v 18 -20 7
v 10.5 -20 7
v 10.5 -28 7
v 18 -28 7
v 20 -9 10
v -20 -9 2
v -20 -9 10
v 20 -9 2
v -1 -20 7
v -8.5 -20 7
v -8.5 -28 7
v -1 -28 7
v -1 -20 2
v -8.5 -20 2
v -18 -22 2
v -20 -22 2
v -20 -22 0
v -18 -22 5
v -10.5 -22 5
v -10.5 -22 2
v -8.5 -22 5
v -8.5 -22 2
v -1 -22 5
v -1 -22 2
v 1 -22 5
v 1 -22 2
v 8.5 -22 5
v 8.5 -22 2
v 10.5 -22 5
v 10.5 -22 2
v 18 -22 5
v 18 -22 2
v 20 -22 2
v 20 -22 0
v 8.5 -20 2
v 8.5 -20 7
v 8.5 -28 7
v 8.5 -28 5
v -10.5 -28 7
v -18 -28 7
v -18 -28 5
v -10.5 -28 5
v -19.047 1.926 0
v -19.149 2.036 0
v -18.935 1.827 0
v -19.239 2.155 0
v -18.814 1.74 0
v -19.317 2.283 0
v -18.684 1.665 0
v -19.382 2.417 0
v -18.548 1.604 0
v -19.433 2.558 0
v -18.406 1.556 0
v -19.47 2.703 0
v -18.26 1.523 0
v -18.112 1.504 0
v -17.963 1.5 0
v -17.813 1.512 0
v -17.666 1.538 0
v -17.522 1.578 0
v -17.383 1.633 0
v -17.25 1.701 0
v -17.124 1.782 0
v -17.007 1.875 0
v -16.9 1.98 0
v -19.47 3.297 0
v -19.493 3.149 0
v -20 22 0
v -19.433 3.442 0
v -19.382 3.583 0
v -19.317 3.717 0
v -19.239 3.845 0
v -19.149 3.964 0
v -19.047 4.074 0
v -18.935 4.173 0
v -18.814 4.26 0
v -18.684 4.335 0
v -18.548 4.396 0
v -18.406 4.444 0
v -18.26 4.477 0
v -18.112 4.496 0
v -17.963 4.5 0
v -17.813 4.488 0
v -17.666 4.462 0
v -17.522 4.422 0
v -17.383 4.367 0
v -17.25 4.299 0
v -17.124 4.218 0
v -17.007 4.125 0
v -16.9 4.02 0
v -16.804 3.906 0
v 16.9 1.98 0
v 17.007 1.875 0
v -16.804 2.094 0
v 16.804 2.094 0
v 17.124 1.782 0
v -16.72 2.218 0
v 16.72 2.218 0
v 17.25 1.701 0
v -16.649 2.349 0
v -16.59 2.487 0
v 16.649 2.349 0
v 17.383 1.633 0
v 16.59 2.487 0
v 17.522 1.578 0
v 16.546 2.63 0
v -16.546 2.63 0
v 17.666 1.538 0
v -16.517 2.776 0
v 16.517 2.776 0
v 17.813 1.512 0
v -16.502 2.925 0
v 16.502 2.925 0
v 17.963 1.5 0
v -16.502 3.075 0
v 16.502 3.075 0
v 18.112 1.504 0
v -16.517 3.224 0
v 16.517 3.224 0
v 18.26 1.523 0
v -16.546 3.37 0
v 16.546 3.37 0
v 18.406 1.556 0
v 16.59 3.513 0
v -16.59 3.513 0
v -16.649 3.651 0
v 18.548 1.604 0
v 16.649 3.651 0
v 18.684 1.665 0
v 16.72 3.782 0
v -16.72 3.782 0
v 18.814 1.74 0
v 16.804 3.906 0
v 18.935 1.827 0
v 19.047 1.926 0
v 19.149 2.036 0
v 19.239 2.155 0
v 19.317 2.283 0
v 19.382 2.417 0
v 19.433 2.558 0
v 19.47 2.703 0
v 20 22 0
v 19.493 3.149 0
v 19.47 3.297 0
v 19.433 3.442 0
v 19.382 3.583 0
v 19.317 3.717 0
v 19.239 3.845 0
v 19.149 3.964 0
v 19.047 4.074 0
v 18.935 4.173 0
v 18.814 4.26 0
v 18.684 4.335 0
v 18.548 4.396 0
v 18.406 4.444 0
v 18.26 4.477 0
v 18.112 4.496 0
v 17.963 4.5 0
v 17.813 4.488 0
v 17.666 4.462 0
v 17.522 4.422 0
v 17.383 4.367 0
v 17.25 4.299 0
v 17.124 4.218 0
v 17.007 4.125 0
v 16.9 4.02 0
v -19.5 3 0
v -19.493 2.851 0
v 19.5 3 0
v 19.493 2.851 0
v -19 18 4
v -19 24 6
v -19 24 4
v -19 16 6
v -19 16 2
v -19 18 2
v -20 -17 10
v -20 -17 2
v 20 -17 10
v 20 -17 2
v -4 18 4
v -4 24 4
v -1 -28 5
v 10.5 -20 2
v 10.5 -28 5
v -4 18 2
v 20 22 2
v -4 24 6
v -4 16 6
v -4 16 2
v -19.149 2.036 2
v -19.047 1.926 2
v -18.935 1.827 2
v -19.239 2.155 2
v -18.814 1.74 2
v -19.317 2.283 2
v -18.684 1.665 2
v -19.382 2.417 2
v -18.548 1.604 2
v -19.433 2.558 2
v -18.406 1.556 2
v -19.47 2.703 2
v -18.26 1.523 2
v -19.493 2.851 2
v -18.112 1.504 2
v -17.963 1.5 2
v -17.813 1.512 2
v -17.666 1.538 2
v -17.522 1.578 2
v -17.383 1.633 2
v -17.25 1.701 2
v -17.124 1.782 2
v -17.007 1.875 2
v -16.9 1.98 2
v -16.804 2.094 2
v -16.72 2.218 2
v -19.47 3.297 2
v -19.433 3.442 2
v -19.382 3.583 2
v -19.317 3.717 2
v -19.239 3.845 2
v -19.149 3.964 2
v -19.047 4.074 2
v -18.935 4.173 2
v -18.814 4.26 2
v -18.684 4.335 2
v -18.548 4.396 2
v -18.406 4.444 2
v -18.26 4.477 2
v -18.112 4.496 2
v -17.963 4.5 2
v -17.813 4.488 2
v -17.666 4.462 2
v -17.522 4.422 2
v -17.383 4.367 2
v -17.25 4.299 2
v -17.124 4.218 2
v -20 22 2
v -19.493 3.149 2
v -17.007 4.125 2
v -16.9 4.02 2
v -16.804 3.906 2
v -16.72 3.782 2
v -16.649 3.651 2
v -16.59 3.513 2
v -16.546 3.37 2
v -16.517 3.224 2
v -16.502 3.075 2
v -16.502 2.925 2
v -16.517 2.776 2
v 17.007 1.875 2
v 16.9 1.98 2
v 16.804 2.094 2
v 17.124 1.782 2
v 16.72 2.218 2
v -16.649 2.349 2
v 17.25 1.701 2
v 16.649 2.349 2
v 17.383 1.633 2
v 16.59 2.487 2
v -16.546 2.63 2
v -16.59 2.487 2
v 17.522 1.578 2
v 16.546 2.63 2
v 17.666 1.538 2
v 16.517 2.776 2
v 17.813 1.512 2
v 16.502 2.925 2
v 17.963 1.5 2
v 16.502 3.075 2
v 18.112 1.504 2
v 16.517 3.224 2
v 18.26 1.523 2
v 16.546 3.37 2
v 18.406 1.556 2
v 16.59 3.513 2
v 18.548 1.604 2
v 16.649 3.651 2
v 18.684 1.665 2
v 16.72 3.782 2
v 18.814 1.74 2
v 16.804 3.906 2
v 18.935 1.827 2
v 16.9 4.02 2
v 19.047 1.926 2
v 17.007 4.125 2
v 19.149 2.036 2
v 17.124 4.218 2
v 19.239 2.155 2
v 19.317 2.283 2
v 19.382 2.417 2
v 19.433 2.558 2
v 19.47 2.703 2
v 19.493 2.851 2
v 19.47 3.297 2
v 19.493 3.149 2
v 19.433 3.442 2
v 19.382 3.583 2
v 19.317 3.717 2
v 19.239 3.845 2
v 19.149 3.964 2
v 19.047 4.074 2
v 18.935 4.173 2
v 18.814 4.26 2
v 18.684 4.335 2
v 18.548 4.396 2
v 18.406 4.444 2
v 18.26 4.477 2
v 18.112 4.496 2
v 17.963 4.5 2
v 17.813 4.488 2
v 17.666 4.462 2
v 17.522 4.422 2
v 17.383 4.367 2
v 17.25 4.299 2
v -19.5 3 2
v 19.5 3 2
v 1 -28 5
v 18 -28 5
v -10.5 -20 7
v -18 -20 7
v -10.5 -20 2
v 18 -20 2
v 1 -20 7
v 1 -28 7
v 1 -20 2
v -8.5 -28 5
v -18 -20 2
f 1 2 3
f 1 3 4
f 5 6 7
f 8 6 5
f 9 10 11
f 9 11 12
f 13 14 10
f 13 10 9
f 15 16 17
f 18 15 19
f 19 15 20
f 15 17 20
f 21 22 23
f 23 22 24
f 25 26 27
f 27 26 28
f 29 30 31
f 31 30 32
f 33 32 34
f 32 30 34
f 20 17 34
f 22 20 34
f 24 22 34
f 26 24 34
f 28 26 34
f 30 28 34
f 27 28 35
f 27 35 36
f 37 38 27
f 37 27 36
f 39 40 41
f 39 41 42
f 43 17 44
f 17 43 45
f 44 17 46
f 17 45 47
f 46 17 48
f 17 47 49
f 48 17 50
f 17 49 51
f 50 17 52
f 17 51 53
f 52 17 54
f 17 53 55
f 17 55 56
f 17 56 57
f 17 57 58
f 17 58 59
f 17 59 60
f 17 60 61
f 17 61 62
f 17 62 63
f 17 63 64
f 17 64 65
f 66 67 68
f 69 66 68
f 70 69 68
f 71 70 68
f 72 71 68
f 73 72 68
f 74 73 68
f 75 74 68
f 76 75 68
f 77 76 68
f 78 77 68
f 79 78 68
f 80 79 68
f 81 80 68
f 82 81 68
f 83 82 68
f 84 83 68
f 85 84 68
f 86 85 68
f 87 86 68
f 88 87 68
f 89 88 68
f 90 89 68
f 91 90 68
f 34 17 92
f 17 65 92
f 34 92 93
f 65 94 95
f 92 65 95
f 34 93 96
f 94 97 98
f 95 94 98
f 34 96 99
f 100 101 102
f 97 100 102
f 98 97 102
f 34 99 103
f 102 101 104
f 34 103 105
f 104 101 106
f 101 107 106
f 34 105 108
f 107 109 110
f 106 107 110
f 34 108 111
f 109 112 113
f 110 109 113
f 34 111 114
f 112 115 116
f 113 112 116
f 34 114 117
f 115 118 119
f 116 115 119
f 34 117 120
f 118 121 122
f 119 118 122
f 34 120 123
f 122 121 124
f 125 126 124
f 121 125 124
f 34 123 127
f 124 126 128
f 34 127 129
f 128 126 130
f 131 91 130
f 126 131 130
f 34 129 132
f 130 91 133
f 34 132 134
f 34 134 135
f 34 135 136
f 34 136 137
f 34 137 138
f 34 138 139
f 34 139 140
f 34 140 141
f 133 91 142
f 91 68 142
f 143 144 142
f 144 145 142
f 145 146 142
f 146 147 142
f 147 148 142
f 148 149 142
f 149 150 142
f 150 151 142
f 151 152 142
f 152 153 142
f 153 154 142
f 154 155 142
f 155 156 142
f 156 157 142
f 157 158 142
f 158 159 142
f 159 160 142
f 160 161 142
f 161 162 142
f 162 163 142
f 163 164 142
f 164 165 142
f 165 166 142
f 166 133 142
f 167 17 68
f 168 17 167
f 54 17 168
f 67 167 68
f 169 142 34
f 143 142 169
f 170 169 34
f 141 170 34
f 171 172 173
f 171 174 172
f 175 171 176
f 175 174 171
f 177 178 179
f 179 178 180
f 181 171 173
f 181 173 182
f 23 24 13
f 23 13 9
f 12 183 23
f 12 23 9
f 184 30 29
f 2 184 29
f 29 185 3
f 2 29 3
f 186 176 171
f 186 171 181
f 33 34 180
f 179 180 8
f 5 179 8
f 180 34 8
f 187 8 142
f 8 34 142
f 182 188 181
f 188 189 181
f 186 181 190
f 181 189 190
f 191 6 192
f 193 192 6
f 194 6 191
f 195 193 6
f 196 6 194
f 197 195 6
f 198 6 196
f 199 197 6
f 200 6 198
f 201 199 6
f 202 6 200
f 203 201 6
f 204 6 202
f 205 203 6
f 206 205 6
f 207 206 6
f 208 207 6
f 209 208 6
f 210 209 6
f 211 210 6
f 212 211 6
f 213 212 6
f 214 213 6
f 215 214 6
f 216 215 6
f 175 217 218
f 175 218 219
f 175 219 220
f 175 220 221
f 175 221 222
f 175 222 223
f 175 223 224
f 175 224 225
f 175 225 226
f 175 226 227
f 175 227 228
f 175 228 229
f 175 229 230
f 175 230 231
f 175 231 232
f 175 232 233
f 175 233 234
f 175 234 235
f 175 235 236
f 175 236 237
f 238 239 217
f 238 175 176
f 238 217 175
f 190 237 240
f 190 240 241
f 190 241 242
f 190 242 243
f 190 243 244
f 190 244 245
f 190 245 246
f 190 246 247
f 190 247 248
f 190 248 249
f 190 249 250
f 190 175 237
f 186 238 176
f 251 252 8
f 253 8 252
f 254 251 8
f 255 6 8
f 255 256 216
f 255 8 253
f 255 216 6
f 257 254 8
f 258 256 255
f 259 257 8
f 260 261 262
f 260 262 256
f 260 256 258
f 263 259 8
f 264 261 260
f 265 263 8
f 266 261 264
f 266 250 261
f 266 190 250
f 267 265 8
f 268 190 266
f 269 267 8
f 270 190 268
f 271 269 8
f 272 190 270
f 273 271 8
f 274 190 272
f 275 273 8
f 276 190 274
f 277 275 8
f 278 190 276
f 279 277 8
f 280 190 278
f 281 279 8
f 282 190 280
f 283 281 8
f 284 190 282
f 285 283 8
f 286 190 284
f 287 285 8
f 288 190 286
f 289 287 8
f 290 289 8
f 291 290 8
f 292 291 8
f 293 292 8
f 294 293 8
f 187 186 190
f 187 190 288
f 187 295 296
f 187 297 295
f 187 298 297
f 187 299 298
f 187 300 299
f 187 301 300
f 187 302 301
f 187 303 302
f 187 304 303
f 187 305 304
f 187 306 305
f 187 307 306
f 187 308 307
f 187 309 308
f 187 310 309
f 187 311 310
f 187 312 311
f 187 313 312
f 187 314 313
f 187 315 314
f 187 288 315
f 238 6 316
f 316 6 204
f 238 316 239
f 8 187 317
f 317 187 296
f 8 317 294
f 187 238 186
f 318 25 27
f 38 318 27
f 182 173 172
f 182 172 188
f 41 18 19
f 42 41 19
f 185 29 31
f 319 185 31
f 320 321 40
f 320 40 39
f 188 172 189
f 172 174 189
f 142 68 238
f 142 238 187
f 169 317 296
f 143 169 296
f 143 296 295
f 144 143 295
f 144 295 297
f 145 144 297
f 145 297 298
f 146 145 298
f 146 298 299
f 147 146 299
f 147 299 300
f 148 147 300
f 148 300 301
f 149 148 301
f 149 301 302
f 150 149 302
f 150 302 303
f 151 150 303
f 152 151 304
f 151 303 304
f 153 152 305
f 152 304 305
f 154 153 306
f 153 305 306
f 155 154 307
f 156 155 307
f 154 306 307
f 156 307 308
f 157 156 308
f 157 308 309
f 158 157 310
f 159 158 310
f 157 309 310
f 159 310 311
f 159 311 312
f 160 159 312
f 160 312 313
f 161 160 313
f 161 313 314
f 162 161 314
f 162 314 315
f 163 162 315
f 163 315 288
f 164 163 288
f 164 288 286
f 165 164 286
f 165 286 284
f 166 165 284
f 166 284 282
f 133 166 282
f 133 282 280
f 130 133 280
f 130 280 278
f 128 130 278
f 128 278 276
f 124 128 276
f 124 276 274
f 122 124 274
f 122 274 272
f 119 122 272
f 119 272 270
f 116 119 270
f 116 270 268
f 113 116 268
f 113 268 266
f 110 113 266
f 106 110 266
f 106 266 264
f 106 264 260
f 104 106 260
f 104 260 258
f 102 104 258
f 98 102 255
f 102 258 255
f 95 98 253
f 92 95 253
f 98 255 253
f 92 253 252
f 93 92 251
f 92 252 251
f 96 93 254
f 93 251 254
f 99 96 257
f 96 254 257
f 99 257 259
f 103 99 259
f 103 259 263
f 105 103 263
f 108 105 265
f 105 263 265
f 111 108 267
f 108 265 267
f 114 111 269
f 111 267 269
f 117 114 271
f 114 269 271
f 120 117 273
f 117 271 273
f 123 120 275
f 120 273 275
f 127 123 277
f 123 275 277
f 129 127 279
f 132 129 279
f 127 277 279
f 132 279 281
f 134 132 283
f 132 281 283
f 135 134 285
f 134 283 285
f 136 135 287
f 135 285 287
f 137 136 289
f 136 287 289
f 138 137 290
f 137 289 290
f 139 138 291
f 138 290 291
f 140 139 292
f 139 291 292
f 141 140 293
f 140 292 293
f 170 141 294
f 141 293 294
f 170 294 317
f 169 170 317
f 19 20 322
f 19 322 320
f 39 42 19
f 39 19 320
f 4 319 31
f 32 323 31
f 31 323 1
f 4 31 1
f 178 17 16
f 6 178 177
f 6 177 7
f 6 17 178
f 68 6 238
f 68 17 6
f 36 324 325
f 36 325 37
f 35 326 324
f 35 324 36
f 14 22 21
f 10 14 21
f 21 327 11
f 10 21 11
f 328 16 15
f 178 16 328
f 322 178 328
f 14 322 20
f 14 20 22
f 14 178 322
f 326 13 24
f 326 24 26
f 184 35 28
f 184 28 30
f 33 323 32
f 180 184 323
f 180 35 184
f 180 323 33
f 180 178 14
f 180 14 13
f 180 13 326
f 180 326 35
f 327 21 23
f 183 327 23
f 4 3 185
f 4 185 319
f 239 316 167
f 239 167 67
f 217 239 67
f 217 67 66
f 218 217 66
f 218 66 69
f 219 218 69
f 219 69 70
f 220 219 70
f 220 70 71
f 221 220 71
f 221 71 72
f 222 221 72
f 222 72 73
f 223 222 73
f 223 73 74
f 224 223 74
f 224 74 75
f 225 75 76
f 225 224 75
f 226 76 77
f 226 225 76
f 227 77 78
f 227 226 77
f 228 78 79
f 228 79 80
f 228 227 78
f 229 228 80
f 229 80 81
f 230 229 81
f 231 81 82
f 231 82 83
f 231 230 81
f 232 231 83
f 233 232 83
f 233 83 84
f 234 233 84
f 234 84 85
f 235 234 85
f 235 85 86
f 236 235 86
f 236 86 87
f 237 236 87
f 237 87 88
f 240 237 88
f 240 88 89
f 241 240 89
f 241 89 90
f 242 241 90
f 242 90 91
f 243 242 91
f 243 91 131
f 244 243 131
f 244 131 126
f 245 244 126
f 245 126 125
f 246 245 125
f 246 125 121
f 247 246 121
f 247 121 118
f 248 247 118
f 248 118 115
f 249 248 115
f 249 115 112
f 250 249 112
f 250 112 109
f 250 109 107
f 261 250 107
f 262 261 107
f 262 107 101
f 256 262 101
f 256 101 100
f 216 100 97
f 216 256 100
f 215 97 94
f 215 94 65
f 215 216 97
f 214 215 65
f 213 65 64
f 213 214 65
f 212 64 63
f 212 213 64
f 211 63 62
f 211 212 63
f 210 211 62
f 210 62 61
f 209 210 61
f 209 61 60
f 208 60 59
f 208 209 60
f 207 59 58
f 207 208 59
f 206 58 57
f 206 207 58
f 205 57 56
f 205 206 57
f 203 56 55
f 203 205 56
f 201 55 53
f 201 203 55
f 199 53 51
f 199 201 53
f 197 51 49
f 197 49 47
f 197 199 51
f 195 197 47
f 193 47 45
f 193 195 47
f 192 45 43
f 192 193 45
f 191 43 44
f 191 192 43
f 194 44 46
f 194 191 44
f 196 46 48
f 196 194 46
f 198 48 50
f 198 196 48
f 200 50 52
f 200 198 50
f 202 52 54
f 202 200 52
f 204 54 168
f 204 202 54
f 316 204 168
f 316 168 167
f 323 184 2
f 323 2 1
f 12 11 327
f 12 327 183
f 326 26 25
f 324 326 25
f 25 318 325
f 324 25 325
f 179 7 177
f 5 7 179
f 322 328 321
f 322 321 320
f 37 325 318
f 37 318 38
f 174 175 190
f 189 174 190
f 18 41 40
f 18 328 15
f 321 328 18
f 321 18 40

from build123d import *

# Parameters (mm, degrees)
ESQUISSE1_W             = 40
ESQUISSE1_H             = 44
BOSS_EXTRU_1_DEPTH      = 2
ESQUISSE2_W             = 40
ESQUISSE2_H             = 8
BOSS_EXTRU_2_DEPTH      = 8
ESQUISSE3_W             = 36
ESQUISSE3_H             = 2
BOSS_EXTRU_3_DEPTH      = 5
ESQUISSE4_W             = 36
ESQUISSE4_H             = 2
BOSS_EXTRU_4_DEPTH      = 6
ENL_V_MAT_EXTRU_1_REACH = 56.772
ESQUISSE5_W             = 2
ESQUISSE5_H             = 5
ESQUISSE6_W             = 15
ESQUISSE6_H             = 2
BOSS_EXTRU_5_DEPTH      = 4
ESQUISSE7_W             = 15
ESQUISSE7_H             = 2
BOSS_EXTRU_6_DEPTH      = 6
ENL_V_MAT_EXTRU_2_REACH = 37.327
ESQUISSE8_R             = 1.5


with BuildPart() as part:
    # Esquisse1 → Boss.-Extru.1 (new body)
    with BuildSketch(Plane.XY):
        Rectangle(ESQUISSE1_W, ESQUISSE1_H)
    extrude(amount=BOSS_EXTRU_1_DEPTH)

    # Esquisse2 → Boss.-Extru.2 (add)
    with BuildSketch(Plane.XY.offset(2)):
        with Locations((0, -13)):
            Rectangle(ESQUISSE2_W, ESQUISSE2_H)
    extrude(amount=BOSS_EXTRU_2_DEPTH)

    # Esquisse3 → Boss.-Extru.3 (add)
    with BuildSketch(Plane.XY.offset(2)):
        with Locations((0, -21)):
            Rectangle(ESQUISSE3_W, ESQUISSE3_H)
    extrude(amount=BOSS_EXTRU_3_DEPTH)

    # Esquisse4 → Boss.-Extru.4 (add)
    with BuildSketch(Plane.XZ.offset(22)):
        with Locations((0, 6)):
            Rectangle(ESQUISSE4_W, ESQUISSE4_H)
    extrude(amount=BOSS_EXTRU_4_DEPTH)

    # Esquisse5 → Enlèv. mat.-Extru.1 (cut, up to next)
    with BuildSketch(Plane.XZ.offset(28), mode=Mode.PRIVATE) as enl_v_mat_extru_1_sk1:
        with Locations((-9.5, 4.5)):
            Rectangle(ESQUISSE5_W, ESQUISSE5_H)
    enl_v_mat_extru_1_tool1 = extrude(enl_v_mat_extru_1_sk1.sketch, amount=-ENL_V_MAT_EXTRU_1_REACH, mode=Mode.PRIVATE) & part.part
    # Esquisse5 → Enlèv. mat.-Extru.1 (cut, up to next)
    with BuildSketch(Plane.XZ.offset(28), mode=Mode.PRIVATE) as enl_v_mat_extru_1_sk2:
        with Locations((0, 4.5)):
            Rectangle(ESQUISSE5_W, ESQUISSE5_H)
    enl_v_mat_extru_1_tool2 = extrude(enl_v_mat_extru_1_sk2.sketch, amount=-ENL_V_MAT_EXTRU_1_REACH, mode=Mode.PRIVATE) & part.part
    # Esquisse5 → Enlèv. mat.-Extru.1 (cut, up to next)
    with BuildSketch(Plane.XZ.offset(28), mode=Mode.PRIVATE) as enl_v_mat_extru_1_sk3:
        with Locations((9.5, 4.5)):
            Rectangle(ESQUISSE5_W, ESQUISSE5_H)
    enl_v_mat_extru_1_tool3 = extrude(enl_v_mat_extru_1_sk3.sketch, amount=-ENL_V_MAT_EXTRU_1_REACH, mode=Mode.PRIVATE) & part.part
    add(enl_v_mat_extru_1_tool1.solids().sort_by_distance((-9.5, -28, 4.5))[0], mode=Mode.SUBTRACT)
    add(enl_v_mat_extru_1_tool2.solids().sort_by_distance((0, -28, 4.5))[0], mode=Mode.SUBTRACT)
    add(enl_v_mat_extru_1_tool3.solids().sort_by_distance((9.5, -28, 4.5))[0], mode=Mode.SUBTRACT)

    # Esquisse6 → Boss.-Extru.5 (add)
    with BuildSketch(Plane.XY.offset(2)):
        with Locations((-11.5, 17)):
            Rectangle(ESQUISSE6_W, ESQUISSE6_H)
    extrude(amount=BOSS_EXTRU_5_DEPTH)

    # Esquisse7 → Boss.-Extru.6 (add)
    with BuildSketch(Plane(origin=(0, 18, 0), x_dir=(1, 0, 0), z_dir=(0, 1, 0))):
        with Locations((-11.5, -5)):
            Rectangle(ESQUISSE7_W, ESQUISSE7_H)
    extrude(amount=BOSS_EXTRU_6_DEPTH)

    # Esquisse8 → Enlèv. mat.-Extru.2 (cut, up to next)
    with BuildSketch(Plane.XY.offset(2), mode=Mode.PRIVATE) as enl_v_mat_extru_2_sk1:
        with Locations((18, 3)):
            Circle(ESQUISSE8_R)
    enl_v_mat_extru_2_tool1 = extrude(enl_v_mat_extru_2_sk1.sketch, amount=-ENL_V_MAT_EXTRU_2_REACH, mode=Mode.PRIVATE) & part.part
    enl_v_mat_extru_2 = enl_v_mat_extru_2_tool1.solids().sort_by_distance((18, 3, 2))[0]
    add(enl_v_mat_extru_2, mode=Mode.SUBTRACT)

    # Symétrie1: Enlèv. mat.-Extru.2 across plane
    add(enl_v_mat_extru_2.mirror(Plane(origin=(0, 0, 0), x_dir=(0, 0, 1), z_dir=(1, 0, 0))), mode=Mode.SUBTRACT)


solid = part.part
